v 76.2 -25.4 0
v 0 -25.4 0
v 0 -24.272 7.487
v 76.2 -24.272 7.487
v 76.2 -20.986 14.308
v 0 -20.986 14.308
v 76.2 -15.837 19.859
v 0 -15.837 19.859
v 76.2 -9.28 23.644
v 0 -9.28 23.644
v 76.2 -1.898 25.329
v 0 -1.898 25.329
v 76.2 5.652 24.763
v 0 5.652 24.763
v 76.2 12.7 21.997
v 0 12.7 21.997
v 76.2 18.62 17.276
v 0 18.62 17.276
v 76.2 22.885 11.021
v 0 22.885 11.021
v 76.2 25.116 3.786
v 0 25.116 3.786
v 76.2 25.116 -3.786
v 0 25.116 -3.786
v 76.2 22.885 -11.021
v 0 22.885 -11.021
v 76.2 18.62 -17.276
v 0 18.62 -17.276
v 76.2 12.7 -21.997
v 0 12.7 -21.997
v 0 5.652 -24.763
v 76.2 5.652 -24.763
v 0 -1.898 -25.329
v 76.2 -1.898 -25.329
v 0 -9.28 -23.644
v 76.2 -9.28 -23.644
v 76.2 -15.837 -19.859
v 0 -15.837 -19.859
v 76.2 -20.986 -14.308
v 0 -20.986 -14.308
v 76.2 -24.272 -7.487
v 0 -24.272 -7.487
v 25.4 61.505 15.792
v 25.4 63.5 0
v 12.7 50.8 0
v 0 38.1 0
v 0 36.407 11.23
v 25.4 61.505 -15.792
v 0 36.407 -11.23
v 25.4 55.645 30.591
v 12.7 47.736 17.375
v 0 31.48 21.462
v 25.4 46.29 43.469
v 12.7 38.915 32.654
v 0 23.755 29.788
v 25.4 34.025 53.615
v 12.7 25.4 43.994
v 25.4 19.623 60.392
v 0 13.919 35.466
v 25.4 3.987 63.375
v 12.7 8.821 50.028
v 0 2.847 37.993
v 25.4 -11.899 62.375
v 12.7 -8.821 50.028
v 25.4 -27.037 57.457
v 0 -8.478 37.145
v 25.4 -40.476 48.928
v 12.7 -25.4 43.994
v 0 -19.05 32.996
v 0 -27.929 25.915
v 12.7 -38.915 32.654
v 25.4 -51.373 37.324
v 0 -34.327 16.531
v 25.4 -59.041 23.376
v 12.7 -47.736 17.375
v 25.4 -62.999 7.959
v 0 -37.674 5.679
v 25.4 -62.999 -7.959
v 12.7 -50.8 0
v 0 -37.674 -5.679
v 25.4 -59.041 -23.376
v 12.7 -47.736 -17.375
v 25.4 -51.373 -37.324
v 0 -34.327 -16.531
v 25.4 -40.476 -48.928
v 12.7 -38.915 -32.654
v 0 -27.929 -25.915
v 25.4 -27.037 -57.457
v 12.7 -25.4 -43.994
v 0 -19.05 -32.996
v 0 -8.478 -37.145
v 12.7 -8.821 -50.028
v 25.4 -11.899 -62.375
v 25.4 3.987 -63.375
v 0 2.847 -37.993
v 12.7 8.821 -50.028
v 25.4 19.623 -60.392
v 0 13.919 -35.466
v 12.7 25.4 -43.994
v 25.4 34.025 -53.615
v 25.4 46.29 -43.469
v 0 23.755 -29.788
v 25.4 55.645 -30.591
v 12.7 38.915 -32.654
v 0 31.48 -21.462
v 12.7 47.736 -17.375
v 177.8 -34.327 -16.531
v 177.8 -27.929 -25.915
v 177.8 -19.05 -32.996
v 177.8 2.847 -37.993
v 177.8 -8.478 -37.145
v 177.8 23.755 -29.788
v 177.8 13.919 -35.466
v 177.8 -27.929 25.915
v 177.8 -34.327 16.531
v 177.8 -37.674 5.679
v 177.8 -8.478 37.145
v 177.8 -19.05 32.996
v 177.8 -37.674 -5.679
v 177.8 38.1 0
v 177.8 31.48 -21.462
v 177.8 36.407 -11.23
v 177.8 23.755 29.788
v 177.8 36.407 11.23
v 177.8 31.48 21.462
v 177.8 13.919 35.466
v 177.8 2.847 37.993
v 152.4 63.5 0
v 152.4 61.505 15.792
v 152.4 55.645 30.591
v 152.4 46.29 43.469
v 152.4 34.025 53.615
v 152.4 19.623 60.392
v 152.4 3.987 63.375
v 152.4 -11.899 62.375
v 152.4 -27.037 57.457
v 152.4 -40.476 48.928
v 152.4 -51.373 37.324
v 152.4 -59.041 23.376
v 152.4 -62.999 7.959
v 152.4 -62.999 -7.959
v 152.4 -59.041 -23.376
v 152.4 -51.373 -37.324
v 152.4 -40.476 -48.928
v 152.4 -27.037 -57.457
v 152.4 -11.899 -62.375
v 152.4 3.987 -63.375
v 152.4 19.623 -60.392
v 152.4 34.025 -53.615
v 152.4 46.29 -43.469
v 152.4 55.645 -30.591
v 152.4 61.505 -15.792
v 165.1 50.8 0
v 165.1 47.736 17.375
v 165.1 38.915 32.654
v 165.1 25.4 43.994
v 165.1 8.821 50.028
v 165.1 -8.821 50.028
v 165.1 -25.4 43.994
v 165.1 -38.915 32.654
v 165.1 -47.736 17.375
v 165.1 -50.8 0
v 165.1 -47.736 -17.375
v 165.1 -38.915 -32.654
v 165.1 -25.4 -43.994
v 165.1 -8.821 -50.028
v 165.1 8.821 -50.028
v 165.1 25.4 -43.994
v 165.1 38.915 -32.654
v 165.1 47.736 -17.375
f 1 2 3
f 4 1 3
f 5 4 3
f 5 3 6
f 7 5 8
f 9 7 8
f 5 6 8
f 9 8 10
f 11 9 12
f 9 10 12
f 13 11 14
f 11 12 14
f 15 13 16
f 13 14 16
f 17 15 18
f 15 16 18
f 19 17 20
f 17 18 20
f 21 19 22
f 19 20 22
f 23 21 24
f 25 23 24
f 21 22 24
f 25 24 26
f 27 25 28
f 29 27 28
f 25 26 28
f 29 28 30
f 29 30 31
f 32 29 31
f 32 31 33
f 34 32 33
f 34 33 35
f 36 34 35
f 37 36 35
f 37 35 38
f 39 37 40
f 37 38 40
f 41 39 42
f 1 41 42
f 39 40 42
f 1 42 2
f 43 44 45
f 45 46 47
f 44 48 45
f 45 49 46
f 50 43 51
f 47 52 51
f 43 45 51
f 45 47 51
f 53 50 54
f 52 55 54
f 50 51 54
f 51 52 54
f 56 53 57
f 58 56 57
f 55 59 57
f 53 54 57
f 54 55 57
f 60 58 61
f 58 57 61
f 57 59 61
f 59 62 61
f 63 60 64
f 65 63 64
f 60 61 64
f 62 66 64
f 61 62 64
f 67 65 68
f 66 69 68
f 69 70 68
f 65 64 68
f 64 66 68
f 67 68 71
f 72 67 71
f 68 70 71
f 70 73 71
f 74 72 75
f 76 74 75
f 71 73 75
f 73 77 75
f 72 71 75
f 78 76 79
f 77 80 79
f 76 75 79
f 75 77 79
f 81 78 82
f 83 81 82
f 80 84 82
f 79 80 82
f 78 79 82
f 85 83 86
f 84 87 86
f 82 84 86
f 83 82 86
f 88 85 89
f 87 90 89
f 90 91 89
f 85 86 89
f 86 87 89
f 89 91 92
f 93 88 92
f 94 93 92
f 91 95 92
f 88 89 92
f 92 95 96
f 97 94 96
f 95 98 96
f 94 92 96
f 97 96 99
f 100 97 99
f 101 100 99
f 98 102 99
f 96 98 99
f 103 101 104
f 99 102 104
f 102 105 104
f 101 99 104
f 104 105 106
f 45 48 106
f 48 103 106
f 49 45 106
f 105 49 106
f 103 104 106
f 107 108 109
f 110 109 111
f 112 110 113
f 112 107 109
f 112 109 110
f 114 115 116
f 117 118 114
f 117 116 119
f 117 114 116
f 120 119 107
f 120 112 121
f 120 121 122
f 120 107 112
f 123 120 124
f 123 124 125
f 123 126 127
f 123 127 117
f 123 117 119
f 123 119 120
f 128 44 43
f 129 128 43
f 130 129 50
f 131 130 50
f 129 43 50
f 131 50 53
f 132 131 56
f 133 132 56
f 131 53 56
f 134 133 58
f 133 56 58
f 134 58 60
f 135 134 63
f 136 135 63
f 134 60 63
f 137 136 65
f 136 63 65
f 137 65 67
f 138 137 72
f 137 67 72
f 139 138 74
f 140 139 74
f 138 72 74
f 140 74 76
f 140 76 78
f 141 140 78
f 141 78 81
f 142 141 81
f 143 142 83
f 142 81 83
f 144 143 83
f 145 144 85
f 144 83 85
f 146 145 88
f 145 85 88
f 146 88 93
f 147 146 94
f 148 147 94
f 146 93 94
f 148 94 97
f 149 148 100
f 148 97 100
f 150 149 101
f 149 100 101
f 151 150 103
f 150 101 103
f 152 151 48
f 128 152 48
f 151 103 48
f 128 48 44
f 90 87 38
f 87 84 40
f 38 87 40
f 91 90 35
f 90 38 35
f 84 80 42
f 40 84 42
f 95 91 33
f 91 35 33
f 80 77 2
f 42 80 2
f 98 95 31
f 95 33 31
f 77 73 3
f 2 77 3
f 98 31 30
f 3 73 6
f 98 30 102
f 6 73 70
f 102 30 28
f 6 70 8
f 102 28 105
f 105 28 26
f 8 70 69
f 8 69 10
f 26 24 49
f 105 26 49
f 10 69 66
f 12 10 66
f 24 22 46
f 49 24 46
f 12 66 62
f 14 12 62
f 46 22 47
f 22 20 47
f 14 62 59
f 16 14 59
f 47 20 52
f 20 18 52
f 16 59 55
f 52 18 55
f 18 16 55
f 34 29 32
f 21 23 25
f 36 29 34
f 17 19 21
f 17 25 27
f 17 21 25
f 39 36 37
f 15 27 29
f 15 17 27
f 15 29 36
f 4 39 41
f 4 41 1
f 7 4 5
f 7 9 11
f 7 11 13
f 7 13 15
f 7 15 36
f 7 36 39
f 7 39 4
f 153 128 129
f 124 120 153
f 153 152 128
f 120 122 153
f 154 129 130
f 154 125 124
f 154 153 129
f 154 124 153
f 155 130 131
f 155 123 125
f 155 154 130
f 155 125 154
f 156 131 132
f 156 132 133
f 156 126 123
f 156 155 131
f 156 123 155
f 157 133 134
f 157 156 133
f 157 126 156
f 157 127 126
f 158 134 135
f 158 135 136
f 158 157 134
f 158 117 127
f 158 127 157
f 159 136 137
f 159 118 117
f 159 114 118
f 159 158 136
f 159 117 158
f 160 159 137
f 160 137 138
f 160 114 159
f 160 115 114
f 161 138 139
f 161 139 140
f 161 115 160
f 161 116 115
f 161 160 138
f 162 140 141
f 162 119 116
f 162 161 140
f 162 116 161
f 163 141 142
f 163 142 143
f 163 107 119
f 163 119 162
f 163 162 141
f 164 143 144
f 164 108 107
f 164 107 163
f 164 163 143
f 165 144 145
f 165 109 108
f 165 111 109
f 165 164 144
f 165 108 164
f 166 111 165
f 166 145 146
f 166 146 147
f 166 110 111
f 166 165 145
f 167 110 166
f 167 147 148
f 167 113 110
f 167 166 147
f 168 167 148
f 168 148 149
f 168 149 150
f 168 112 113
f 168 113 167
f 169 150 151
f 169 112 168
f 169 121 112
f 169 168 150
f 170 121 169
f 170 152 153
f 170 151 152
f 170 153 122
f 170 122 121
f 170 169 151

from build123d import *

# Parameters (mm, degrees)
F0_R     = 63.5
F1_DEPTH = 177.8
F2_R     = 25.4
F3_DEPTH = 76.2
F4_SIZE  = 25.4


with BuildPart() as f1:
    # F0 (on Right) → F1 (new body)
    with BuildSketch(Plane.YZ):
        Circle(F0_R)
    extrude(amount=F1_DEPTH)

    # F2 (on face) → F3 (cut)
    with BuildSketch(Plane(origin=(0, 0, 0), x_dir=(0, -1, 0), z_dir=(-1, 0, 0))):
        Circle(F2_R)
    extrude(amount=-F3_DEPTH, mode=Mode.SUBTRACT)

    # F4
    f4_edges = [f1.edges().sort_by_distance(p)[0] for p in [
        (0, -63.5, 0),
        (177.8, -63.5, 0),
    ]]
    chamfer(f4_edges, length=F4_SIZE)


solid = f1.part
